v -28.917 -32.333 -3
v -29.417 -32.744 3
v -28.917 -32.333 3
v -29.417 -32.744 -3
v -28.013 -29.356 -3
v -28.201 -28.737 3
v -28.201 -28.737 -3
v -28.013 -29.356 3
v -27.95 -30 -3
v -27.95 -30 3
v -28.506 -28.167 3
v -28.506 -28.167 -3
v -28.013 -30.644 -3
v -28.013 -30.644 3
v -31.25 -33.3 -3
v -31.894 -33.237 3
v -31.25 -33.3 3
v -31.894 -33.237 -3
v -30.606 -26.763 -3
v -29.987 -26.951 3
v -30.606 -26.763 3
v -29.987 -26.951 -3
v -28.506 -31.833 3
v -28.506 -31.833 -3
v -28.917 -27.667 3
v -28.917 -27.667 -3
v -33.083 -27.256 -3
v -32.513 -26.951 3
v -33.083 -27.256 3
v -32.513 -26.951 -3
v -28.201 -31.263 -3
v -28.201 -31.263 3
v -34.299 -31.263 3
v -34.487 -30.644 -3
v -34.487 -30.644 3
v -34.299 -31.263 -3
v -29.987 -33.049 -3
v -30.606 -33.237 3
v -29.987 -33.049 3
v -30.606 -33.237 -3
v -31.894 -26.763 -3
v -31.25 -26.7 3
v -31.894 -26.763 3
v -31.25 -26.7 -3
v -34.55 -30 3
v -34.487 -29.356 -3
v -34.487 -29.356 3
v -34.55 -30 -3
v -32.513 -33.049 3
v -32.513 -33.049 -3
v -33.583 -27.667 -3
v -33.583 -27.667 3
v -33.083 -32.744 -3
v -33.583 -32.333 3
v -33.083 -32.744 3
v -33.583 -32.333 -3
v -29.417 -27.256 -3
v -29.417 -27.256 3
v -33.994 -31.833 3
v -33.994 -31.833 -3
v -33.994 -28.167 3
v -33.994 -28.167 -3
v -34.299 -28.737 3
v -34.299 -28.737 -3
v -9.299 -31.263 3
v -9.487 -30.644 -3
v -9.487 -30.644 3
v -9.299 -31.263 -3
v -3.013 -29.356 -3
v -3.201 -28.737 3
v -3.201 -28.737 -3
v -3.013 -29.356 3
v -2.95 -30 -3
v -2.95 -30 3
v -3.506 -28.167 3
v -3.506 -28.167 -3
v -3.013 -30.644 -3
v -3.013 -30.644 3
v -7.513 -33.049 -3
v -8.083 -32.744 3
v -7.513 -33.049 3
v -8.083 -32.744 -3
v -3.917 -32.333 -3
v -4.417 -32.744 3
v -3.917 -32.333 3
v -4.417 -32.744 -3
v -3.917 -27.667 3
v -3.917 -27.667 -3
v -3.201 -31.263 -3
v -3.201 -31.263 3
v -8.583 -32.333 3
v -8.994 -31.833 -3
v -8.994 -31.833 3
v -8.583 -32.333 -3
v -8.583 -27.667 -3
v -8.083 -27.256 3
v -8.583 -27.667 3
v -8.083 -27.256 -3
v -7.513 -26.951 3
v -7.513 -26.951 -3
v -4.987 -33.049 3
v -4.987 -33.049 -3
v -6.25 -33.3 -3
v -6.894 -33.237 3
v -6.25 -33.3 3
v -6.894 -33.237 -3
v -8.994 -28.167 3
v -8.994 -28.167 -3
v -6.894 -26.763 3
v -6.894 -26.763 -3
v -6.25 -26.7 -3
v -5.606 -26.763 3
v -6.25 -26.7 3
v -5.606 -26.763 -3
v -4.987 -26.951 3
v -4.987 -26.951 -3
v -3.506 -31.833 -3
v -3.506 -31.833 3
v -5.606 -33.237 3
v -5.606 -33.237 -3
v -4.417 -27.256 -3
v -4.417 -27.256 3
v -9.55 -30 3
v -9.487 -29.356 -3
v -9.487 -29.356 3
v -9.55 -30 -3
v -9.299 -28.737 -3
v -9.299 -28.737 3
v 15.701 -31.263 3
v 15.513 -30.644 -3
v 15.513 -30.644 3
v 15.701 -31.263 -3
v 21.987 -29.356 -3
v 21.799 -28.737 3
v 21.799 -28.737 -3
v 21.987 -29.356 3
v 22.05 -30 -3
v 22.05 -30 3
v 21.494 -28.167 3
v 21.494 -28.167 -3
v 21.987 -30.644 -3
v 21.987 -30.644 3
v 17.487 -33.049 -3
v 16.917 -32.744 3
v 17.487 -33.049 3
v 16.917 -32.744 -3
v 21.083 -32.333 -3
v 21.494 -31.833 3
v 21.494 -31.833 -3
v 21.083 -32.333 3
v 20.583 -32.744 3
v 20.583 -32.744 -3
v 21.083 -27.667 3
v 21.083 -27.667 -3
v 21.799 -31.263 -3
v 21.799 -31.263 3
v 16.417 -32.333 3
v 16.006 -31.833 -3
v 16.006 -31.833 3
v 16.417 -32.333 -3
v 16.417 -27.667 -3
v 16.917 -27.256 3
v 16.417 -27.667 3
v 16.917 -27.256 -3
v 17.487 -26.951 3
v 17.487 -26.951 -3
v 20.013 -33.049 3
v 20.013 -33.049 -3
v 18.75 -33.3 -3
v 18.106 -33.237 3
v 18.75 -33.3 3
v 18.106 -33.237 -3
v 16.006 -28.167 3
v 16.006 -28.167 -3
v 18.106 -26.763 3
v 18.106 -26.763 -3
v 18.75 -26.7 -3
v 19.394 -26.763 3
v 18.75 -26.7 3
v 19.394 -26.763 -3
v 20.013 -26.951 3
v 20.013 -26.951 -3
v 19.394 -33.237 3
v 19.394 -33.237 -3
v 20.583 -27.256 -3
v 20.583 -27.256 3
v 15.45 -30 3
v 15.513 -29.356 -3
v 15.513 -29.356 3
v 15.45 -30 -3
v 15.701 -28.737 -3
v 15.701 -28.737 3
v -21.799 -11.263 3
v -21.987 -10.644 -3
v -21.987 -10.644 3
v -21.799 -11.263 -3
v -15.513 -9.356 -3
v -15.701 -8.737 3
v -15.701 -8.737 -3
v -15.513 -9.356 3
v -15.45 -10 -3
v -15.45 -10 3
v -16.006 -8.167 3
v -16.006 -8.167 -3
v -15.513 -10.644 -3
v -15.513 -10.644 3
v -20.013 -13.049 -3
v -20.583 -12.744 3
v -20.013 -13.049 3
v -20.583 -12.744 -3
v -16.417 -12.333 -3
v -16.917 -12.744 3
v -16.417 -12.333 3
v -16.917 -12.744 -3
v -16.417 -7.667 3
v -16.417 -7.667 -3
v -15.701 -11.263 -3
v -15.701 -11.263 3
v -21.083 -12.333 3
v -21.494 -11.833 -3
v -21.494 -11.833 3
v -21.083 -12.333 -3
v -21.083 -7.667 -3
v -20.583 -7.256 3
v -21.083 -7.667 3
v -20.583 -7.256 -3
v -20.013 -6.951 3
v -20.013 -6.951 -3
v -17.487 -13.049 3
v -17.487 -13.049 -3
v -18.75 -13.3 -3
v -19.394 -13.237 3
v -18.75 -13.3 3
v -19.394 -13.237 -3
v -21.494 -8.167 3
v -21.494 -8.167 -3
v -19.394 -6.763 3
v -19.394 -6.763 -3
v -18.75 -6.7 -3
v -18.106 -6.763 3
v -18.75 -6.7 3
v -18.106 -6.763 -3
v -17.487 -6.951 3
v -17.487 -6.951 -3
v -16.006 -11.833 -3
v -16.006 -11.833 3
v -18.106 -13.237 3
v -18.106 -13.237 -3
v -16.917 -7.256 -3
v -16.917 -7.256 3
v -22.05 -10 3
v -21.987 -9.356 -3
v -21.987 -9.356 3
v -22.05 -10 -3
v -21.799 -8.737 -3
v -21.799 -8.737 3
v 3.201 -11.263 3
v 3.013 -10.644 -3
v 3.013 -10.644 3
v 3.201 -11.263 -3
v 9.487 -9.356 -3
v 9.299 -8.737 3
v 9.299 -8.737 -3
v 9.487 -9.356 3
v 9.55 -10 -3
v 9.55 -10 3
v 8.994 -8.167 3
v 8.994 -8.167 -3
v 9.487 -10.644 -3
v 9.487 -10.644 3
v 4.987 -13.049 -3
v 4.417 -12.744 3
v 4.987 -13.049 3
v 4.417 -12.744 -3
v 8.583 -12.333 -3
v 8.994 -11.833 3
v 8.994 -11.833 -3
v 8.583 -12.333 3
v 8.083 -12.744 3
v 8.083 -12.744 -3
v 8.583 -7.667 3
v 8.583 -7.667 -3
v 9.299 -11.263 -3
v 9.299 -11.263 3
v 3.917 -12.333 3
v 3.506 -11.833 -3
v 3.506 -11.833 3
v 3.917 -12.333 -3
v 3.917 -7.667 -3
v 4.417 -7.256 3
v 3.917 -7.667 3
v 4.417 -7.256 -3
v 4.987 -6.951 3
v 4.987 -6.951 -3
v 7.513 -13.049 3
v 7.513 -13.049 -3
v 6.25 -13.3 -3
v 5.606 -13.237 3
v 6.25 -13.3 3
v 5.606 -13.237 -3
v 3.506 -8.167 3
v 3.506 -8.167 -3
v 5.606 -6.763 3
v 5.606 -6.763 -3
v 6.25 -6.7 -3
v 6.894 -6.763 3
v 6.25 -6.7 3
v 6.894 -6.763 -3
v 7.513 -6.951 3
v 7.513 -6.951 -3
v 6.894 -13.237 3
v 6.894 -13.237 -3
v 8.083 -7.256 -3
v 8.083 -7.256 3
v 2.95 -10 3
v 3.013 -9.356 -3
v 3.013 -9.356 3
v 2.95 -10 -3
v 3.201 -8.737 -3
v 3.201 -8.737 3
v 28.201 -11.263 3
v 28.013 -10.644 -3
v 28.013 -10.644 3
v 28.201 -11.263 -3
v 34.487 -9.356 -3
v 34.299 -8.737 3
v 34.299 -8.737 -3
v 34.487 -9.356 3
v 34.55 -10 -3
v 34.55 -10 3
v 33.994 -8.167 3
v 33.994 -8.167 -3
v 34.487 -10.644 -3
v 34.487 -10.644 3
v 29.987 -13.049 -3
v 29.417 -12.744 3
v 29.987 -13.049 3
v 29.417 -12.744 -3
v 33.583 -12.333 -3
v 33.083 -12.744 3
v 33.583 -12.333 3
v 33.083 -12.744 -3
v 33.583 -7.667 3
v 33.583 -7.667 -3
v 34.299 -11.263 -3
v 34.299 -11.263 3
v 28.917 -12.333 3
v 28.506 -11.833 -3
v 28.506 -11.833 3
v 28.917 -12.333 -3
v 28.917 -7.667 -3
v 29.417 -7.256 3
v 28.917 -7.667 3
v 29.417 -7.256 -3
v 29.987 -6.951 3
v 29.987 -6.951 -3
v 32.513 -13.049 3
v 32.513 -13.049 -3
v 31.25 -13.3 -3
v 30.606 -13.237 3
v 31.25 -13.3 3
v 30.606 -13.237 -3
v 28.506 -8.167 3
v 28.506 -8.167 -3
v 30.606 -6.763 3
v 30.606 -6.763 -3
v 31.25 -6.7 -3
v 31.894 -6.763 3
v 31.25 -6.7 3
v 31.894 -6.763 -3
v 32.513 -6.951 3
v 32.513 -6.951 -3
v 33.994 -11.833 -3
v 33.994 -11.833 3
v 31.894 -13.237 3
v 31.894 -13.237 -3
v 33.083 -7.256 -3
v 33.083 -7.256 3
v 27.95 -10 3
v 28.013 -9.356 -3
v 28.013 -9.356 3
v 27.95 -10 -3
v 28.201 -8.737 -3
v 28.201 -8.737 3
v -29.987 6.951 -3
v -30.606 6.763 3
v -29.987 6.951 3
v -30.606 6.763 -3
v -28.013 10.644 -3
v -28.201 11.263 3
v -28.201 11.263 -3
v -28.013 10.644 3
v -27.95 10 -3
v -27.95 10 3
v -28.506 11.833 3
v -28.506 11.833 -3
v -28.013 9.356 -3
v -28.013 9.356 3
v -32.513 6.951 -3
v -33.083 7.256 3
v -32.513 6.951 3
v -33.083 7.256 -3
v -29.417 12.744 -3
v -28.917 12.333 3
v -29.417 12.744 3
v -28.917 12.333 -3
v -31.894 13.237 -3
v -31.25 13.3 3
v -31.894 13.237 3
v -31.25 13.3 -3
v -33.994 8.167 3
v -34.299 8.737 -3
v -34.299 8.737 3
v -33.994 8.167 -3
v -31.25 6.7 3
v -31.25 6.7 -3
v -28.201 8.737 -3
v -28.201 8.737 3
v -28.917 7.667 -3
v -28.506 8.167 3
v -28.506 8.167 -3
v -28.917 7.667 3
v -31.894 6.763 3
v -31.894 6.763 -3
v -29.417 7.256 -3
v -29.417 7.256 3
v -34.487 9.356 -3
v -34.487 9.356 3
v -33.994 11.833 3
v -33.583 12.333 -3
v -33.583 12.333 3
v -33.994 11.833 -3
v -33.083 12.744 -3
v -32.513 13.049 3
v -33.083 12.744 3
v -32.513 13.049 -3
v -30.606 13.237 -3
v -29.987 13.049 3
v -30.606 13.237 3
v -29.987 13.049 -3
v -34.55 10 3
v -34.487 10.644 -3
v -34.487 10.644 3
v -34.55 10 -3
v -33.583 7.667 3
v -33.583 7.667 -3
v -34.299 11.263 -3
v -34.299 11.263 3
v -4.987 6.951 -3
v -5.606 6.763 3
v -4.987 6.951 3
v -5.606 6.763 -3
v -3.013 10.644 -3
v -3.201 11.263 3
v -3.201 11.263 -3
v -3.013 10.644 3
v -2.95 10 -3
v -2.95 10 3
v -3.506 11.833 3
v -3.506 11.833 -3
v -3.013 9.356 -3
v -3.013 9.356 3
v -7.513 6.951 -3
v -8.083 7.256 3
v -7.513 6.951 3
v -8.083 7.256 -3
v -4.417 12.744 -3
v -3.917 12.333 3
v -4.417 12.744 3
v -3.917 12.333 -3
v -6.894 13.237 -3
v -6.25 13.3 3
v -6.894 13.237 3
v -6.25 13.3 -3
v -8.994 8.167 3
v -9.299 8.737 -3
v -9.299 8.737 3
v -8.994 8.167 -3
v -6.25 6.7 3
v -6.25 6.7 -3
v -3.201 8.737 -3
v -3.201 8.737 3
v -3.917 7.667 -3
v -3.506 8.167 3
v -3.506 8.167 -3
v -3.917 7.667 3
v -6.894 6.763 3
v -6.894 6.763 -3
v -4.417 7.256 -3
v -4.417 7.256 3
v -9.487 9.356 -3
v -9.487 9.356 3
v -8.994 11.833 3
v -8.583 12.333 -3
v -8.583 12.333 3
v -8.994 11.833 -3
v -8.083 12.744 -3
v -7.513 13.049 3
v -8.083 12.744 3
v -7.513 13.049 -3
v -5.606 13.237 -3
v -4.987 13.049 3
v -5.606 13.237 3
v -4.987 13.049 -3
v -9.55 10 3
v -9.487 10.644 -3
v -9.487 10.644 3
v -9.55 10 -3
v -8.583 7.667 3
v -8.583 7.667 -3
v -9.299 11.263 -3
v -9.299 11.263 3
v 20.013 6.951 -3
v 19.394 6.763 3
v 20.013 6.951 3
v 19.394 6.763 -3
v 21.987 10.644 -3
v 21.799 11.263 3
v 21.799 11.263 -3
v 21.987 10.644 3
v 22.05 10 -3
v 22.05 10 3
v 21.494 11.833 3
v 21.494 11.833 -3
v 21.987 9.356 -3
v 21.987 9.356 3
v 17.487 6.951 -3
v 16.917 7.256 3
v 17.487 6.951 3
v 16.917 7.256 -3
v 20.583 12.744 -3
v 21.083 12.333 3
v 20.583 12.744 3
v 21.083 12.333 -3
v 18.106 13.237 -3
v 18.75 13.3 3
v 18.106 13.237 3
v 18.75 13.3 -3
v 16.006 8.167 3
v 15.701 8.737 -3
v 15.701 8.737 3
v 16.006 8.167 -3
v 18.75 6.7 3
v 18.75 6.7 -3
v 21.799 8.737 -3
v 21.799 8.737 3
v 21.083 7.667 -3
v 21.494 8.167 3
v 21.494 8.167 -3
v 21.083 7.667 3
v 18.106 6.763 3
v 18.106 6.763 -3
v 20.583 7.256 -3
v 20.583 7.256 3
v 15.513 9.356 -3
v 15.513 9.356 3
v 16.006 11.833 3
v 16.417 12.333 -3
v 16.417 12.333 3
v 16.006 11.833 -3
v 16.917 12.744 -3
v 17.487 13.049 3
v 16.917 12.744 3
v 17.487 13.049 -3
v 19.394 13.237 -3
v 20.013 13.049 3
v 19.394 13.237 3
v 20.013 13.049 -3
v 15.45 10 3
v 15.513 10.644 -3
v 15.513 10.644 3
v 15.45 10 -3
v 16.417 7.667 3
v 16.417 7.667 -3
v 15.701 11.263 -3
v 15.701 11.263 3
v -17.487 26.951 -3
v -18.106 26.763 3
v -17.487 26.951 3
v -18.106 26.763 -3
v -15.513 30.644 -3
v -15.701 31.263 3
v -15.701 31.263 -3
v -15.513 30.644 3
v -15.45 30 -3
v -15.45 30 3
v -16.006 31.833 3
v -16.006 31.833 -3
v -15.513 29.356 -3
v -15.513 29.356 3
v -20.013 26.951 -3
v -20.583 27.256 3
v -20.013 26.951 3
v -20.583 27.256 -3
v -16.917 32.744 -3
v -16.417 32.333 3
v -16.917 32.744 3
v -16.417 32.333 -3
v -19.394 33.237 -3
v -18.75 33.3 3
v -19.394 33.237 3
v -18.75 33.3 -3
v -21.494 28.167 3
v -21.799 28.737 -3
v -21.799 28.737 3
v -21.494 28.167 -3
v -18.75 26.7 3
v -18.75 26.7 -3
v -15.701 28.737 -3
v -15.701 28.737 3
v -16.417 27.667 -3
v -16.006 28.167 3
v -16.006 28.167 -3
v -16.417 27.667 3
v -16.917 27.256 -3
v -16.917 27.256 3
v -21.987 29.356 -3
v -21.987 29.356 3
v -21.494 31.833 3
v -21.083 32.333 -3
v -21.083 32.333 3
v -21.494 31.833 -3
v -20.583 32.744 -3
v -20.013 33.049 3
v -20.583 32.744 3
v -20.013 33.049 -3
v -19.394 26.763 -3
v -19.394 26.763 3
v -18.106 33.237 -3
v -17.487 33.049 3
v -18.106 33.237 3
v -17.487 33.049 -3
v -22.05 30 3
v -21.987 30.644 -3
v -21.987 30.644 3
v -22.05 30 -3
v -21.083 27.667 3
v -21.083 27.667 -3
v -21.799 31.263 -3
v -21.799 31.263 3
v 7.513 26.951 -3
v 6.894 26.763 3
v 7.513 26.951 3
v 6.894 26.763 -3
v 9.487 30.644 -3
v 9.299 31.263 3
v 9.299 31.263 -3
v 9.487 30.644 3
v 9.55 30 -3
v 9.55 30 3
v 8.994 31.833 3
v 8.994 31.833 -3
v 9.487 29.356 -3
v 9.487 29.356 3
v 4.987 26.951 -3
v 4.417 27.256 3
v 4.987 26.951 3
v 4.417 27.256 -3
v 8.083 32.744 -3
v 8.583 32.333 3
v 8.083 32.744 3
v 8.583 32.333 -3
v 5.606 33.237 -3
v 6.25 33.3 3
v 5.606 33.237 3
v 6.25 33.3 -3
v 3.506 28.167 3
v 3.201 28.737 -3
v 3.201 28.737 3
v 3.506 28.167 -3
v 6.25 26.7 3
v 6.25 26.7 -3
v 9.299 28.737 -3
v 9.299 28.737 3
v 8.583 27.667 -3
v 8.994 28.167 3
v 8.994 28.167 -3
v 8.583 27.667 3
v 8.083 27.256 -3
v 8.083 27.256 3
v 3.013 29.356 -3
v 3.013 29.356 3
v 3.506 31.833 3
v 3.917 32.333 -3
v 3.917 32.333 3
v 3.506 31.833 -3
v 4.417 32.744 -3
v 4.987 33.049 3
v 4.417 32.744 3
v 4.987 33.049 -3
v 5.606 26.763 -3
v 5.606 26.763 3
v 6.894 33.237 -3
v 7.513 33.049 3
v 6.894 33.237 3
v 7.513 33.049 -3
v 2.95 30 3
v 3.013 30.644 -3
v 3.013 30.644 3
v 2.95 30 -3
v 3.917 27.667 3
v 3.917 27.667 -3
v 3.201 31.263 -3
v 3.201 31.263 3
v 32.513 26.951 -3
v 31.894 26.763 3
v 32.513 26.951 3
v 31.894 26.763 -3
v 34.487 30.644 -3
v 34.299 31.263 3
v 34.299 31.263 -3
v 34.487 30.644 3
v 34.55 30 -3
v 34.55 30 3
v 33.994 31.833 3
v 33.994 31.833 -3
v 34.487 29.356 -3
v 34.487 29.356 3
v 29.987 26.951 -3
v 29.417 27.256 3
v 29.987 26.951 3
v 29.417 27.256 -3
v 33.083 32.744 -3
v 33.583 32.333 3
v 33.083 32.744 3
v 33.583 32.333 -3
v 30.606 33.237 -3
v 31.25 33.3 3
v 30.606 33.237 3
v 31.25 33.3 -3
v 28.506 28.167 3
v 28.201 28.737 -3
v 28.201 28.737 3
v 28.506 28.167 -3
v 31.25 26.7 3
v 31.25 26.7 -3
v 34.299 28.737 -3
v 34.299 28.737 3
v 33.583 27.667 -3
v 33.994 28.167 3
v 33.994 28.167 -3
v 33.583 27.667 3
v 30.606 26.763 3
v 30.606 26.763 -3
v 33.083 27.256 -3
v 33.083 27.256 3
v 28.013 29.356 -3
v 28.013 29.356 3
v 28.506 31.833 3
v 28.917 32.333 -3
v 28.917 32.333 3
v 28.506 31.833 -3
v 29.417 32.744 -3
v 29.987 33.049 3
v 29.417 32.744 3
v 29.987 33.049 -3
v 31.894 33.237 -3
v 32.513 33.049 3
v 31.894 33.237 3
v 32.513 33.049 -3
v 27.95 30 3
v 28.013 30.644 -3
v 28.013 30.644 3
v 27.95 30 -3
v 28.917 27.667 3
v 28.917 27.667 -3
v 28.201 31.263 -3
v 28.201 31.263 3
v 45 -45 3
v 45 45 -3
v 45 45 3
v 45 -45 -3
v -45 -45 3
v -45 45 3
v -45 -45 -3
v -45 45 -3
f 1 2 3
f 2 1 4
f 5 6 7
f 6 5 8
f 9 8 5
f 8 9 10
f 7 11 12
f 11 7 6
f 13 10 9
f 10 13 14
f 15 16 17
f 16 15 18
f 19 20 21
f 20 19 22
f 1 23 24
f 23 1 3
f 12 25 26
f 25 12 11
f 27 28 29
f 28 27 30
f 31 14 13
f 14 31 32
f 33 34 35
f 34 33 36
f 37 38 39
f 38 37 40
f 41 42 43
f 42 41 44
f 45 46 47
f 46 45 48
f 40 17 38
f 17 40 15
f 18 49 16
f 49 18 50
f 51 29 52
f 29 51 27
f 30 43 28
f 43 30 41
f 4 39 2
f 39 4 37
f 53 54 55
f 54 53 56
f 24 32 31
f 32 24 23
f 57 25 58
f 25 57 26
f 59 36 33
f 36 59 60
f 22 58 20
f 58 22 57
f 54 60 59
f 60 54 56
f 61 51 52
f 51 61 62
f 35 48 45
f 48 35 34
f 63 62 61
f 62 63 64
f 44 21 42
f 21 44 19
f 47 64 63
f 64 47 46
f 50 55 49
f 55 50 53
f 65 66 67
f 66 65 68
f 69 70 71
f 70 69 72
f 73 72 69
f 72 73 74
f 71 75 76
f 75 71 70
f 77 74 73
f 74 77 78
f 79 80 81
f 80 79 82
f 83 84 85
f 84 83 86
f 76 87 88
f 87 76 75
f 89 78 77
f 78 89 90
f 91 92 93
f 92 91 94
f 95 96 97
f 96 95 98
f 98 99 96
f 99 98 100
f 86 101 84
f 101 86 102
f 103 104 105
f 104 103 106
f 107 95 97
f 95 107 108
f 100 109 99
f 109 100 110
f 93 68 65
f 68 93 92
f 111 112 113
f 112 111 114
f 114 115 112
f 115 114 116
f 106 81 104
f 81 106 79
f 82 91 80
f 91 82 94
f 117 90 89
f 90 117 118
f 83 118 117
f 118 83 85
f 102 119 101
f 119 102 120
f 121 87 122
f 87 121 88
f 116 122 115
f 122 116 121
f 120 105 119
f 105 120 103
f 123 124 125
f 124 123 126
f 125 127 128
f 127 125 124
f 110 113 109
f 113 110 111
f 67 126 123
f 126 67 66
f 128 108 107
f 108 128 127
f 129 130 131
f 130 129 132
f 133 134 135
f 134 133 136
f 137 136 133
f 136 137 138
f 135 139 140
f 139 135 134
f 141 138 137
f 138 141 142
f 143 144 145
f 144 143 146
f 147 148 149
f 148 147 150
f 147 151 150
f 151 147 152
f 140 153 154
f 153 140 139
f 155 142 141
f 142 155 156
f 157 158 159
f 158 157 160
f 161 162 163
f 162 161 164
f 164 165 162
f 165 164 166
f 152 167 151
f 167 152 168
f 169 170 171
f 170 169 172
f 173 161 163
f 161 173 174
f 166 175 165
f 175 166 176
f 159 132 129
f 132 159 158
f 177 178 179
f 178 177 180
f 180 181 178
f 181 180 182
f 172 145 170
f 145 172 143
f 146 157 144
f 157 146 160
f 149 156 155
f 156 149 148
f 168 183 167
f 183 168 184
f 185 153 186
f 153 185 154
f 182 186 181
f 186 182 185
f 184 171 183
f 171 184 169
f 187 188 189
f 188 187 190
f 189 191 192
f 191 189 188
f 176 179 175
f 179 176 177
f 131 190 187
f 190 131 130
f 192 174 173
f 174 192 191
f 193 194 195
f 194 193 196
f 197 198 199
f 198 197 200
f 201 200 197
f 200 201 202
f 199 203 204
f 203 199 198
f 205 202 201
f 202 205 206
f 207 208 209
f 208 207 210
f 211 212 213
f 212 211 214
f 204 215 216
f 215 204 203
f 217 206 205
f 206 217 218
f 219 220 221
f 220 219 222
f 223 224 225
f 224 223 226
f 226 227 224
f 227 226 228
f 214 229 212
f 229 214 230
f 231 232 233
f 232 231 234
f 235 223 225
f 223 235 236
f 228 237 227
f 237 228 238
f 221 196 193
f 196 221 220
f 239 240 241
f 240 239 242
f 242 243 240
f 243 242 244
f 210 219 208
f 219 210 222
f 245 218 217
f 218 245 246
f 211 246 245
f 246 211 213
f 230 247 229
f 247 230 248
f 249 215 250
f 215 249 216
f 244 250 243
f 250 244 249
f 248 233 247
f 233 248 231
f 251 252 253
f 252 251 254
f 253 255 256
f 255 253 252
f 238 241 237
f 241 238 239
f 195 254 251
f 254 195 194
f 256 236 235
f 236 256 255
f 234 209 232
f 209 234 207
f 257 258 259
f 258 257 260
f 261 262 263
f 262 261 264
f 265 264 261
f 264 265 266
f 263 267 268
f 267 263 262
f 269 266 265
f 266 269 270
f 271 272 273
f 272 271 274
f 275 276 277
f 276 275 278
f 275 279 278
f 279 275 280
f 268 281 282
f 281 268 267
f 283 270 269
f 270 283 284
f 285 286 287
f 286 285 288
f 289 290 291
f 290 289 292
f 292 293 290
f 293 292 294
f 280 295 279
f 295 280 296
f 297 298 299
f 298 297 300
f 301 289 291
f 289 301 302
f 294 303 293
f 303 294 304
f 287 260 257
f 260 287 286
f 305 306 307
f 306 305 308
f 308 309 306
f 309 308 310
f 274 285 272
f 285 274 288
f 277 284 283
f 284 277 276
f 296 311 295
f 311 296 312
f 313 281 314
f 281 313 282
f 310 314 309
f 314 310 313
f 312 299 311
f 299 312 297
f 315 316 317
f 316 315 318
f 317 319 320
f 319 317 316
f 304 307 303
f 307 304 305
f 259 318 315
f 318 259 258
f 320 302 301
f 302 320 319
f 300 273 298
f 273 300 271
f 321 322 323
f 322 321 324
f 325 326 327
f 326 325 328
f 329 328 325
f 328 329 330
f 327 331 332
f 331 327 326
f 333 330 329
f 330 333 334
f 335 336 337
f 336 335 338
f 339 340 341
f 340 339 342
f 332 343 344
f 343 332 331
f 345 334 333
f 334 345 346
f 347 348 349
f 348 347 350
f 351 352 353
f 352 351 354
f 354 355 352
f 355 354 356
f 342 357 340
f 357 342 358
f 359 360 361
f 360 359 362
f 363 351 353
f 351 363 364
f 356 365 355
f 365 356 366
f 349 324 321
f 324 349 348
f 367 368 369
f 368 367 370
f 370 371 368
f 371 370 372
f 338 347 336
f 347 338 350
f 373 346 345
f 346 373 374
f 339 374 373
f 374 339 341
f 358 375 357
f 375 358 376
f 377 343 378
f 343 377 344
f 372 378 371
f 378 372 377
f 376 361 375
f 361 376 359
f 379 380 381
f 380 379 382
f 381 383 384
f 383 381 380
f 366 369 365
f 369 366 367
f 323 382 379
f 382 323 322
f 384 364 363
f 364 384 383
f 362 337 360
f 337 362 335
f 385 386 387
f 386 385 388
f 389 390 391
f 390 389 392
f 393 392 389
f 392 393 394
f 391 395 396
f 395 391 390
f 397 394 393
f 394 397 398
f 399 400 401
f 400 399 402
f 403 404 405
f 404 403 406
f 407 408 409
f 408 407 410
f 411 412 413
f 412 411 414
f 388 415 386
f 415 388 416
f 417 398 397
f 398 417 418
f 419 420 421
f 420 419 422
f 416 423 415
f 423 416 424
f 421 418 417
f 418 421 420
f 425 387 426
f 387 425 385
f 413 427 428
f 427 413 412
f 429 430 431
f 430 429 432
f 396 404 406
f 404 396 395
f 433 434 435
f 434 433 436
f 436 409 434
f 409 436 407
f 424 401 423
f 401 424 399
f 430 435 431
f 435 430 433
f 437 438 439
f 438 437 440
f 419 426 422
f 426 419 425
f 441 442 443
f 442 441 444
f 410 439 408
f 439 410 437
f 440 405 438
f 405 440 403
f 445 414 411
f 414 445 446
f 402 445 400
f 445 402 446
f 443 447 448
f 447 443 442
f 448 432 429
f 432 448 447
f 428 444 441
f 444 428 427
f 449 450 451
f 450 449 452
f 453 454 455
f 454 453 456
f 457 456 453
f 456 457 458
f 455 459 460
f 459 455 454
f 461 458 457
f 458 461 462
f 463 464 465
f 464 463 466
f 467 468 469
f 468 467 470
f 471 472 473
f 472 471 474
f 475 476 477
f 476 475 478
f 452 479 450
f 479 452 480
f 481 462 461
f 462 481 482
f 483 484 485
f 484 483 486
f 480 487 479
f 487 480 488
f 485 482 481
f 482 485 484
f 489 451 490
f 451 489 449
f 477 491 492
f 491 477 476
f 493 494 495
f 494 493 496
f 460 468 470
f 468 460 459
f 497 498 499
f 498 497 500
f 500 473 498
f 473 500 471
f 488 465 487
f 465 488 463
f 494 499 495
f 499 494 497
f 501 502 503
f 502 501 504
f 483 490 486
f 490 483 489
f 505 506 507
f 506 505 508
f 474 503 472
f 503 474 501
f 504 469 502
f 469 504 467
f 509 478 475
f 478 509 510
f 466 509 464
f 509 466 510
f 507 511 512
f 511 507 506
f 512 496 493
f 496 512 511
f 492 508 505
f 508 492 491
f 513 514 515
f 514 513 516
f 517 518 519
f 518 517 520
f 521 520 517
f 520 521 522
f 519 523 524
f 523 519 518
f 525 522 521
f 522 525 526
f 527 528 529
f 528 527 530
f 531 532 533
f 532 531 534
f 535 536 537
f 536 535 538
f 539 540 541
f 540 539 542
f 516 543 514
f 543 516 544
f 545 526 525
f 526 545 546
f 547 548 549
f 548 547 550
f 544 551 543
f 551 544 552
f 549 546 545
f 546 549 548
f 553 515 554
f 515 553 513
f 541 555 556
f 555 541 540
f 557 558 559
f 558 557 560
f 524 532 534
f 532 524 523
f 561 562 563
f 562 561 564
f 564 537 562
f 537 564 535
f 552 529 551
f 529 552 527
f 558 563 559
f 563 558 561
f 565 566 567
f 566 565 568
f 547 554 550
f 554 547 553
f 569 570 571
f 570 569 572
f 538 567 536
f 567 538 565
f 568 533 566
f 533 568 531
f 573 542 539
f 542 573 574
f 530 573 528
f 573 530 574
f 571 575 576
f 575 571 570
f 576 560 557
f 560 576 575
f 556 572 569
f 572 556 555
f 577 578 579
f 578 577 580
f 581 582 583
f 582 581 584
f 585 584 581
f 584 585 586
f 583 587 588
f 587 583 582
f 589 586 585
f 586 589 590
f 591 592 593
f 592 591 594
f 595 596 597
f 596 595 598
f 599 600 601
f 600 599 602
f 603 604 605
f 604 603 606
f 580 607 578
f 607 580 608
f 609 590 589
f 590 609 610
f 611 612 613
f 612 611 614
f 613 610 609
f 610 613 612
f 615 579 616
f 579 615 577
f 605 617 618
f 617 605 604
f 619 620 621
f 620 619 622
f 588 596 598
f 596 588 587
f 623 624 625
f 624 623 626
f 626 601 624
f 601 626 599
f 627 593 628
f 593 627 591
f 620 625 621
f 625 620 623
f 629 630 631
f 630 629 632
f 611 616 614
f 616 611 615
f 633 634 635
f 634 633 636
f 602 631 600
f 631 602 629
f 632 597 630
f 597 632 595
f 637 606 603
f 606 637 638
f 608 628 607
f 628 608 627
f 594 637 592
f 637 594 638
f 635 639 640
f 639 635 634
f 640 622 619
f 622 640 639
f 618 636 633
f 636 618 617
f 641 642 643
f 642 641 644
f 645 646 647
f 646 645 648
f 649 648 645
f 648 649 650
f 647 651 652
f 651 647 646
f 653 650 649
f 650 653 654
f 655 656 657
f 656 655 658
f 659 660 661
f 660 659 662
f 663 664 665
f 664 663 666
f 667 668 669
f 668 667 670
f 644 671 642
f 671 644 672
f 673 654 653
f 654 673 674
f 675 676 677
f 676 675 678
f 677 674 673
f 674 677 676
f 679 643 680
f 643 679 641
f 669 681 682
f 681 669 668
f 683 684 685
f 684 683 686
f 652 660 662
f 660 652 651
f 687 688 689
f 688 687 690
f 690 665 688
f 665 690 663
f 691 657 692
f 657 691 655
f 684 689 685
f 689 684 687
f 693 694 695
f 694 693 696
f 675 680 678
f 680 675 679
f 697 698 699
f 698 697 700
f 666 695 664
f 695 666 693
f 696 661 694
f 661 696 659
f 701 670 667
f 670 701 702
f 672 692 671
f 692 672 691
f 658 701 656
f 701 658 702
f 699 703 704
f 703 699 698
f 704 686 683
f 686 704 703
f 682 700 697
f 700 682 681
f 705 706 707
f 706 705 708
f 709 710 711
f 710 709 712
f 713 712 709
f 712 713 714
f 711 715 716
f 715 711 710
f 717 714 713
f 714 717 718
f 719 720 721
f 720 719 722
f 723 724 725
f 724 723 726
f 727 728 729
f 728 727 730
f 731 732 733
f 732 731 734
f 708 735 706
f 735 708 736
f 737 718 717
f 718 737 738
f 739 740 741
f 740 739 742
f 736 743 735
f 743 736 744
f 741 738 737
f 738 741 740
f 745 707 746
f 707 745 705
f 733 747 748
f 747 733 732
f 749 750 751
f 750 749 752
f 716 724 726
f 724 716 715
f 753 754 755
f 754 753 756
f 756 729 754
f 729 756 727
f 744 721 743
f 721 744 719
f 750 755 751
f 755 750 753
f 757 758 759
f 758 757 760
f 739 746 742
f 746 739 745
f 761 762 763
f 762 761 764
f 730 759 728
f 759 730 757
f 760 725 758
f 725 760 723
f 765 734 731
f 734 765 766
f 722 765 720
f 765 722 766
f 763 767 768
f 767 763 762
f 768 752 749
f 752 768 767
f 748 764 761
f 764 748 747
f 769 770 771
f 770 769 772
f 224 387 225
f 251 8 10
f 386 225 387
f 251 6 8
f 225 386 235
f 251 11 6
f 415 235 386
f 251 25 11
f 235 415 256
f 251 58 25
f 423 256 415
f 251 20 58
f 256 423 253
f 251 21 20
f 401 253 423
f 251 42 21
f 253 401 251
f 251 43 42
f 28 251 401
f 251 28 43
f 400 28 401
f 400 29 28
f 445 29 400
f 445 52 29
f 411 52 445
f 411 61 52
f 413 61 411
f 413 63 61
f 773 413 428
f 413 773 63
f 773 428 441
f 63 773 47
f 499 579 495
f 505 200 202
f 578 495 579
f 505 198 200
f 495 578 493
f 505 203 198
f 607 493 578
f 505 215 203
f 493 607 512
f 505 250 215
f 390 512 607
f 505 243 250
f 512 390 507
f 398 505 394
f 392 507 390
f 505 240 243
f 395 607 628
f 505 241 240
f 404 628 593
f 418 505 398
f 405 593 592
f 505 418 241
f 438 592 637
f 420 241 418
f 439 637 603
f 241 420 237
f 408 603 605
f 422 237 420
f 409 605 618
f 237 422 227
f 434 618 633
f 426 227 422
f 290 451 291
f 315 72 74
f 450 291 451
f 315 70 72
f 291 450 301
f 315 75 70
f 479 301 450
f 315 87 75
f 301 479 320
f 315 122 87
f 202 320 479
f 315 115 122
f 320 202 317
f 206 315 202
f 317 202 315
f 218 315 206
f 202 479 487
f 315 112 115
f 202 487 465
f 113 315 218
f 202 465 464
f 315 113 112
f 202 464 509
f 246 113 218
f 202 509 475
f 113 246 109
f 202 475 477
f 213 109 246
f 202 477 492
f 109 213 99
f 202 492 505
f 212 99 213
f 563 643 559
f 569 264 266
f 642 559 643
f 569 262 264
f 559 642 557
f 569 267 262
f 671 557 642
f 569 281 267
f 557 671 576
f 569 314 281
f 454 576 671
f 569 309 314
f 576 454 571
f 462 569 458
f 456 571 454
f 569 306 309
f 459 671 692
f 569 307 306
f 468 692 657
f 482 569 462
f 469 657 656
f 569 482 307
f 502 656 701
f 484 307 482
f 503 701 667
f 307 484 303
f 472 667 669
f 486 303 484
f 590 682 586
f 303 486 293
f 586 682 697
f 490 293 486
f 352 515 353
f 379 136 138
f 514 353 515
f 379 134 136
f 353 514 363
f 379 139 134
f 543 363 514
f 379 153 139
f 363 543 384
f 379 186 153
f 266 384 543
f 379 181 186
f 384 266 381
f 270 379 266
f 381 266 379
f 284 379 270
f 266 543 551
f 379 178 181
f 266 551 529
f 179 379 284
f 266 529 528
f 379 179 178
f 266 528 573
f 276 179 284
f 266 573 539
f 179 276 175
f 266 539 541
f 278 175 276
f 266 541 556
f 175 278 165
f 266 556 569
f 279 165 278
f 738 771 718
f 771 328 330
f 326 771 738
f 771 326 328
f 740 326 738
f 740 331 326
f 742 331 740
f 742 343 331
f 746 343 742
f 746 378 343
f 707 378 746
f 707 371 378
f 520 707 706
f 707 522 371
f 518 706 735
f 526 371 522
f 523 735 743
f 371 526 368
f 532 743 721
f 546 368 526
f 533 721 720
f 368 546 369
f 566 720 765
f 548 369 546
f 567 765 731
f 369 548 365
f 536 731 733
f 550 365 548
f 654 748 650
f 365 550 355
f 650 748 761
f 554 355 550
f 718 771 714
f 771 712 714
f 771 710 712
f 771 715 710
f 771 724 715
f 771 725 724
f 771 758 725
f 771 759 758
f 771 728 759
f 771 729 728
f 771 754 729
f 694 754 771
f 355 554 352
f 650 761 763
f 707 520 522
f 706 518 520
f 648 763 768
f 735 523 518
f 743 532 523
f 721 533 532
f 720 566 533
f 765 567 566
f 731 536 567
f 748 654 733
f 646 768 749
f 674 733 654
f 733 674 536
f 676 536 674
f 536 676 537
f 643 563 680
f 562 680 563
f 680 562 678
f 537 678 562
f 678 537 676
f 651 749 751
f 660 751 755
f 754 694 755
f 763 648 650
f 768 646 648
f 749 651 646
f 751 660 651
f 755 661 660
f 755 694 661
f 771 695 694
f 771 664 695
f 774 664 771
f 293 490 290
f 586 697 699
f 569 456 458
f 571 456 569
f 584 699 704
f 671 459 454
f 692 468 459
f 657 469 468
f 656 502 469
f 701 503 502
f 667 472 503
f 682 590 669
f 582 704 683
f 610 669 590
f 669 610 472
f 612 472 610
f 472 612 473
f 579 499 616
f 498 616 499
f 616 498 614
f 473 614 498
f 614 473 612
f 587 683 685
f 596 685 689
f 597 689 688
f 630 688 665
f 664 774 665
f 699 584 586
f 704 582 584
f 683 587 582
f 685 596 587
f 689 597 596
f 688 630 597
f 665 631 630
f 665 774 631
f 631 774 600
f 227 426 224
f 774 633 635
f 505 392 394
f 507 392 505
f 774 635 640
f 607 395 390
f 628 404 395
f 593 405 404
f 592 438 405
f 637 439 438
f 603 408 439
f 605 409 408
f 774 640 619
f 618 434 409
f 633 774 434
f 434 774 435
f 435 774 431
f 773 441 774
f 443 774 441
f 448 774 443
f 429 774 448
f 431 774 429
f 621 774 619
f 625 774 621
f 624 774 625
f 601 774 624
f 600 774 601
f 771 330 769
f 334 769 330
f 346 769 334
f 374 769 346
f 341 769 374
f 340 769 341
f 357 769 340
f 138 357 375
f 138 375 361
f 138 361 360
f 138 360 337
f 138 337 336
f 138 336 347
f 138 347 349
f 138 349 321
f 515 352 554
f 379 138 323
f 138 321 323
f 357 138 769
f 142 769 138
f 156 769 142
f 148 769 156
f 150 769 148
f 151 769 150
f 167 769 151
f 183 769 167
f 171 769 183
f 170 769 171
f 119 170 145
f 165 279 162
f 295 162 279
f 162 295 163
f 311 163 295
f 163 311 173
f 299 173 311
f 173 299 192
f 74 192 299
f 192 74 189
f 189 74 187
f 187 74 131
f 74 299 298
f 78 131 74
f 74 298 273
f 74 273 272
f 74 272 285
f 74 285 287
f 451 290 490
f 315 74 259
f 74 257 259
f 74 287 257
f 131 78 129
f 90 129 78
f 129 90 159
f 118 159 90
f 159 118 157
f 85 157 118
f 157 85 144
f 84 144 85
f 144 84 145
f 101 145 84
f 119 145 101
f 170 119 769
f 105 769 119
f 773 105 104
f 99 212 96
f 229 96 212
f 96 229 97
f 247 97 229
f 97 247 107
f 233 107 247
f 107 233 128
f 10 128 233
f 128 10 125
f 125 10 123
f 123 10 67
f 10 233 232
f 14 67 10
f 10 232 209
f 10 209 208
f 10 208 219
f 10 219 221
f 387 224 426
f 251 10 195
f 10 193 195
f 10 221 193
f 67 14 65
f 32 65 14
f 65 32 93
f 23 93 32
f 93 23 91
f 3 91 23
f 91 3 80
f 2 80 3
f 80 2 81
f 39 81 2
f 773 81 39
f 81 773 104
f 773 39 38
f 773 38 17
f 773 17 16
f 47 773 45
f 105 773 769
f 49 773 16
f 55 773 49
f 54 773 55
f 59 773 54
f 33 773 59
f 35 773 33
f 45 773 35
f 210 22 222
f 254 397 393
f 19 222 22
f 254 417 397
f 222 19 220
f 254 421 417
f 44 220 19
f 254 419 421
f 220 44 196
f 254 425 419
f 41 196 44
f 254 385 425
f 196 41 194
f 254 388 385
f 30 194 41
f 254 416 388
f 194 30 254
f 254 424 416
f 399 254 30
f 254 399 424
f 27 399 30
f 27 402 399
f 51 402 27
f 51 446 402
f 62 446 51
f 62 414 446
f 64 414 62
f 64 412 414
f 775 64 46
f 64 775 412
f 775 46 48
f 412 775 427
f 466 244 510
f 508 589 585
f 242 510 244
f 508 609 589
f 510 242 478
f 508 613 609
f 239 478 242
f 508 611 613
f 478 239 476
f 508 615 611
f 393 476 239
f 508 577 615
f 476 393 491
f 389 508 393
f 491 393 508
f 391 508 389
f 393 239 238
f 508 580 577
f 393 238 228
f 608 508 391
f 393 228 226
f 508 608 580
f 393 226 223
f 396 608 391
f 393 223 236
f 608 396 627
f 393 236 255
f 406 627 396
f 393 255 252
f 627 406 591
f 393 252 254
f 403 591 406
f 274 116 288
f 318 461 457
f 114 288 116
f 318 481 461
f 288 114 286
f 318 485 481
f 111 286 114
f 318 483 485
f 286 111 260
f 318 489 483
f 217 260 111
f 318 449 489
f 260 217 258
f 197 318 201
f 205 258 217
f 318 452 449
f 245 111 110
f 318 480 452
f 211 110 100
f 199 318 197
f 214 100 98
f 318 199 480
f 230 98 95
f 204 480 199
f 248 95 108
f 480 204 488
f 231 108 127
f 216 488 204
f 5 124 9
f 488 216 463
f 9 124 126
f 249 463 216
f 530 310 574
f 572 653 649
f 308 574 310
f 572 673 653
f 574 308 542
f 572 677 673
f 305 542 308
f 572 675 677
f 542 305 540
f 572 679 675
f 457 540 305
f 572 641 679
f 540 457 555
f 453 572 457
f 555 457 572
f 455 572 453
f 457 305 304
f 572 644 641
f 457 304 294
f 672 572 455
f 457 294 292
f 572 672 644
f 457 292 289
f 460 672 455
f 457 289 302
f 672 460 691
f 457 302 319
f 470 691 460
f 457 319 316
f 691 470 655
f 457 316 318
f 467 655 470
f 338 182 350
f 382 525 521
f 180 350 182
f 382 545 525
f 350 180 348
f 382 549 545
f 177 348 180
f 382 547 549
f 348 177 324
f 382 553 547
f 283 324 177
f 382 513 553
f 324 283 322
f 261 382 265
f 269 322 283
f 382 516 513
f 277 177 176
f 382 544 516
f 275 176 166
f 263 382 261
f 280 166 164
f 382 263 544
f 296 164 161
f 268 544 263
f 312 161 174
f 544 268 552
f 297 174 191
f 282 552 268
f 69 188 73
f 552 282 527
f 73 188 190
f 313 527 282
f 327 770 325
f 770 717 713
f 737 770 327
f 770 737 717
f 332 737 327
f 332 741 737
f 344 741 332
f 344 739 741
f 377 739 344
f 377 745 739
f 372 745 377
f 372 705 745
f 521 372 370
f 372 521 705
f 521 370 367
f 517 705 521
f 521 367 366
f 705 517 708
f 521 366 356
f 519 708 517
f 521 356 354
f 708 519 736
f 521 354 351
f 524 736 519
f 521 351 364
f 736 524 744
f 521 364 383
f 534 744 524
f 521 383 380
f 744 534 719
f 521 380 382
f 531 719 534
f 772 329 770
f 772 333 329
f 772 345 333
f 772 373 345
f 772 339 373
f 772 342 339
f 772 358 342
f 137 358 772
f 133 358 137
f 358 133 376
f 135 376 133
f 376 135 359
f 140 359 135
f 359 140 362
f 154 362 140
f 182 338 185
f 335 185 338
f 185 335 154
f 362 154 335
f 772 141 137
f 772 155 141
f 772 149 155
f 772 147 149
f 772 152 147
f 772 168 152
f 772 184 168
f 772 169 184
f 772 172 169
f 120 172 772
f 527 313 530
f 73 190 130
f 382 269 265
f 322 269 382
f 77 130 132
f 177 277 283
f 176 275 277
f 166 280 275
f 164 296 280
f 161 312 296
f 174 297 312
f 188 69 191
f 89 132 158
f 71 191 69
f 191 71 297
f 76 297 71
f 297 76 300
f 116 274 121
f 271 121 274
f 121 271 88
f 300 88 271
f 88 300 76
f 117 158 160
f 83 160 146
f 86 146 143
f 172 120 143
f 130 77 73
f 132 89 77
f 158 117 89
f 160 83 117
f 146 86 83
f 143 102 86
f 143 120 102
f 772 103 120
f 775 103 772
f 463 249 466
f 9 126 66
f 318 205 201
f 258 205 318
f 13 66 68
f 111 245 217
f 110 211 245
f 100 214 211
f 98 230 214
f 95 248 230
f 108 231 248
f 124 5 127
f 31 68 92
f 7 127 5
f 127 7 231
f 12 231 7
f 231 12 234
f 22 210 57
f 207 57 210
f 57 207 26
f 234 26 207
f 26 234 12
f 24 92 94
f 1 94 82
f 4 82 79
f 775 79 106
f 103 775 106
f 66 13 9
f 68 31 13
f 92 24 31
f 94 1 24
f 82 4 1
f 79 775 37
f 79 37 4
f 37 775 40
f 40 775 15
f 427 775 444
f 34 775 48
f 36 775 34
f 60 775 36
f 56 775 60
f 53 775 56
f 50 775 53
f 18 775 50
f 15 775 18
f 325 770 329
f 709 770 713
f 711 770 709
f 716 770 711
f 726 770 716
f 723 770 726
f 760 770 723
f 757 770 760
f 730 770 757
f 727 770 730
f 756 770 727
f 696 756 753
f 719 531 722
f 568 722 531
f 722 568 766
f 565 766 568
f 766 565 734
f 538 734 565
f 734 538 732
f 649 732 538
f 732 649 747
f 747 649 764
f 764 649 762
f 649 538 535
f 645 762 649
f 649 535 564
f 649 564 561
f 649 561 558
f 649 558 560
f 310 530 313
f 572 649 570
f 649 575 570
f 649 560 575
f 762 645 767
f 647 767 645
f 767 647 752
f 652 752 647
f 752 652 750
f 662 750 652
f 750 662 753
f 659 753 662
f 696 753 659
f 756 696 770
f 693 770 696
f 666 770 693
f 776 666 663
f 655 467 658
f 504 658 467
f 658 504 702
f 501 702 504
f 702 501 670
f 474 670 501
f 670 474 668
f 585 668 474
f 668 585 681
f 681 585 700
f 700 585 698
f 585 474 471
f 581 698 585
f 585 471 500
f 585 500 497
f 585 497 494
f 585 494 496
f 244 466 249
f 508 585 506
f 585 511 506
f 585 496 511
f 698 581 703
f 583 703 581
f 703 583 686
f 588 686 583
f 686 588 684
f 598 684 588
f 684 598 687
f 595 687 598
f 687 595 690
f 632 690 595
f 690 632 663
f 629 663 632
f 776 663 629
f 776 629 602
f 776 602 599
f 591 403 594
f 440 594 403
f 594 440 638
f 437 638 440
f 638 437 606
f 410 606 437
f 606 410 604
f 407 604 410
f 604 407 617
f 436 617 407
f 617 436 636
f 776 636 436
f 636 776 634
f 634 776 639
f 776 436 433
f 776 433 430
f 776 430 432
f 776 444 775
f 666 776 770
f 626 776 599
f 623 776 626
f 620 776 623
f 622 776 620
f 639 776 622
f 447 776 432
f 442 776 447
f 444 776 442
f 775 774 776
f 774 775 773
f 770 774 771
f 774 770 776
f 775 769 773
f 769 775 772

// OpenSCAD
$fn = 32;

// ----------------------------------------------------------------------
// Perforated panel 90 x 90 x 6
// 4 x 3 Ø6.6 holes, checker layout
// ----------------------------------------------------------------------

// --- parameters (mm) ---
panel = [90, 90, 6];  // overall size (x, y, z)
seat_tol = 0.05;      // tolerance at the seating features
free_tol = 0.3;       // general tolerance on the free sizes
hole_d = 6.6;         // hole diameter
pitch_x = 25;         // hole pitch along X
pitch_y = 20;         // hole pitch along Y

// --- derived feature positions (mm) ---
margin = hole_d / 2 + 2;            // = 5.3   clearance from the panel edge
row_offset = pitch_x / 2;           // = 12.5   shift of every other row
cols = floor((panel[0] - 2 * margin - row_offset) / pitch_x) + 1;  // = 3   how many columns fit in X
rows = floor((panel[1] - 2 * margin) / pitch_y) + 1;  // = 4   how many rows fit in Y
span_x = (cols - 1) * pitch_x + row_offset;  // = 62.5   width of the field
span_y = (rows - 1) * pitch_y;      // = 60   height of the field
origin_x = -span_x / 2;             // = -31.25   X of the first hole
origin_y = -span_y / 2;             // = -30   Y of the first row
holes = rows * cols;                // = 12   holes in total
feature_centers = [
  [origin_x + 0 * pitch_x, origin_y + 0 * pitch_y],
  [origin_x + 1 * pitch_x, origin_y + 0 * pitch_y],
  [origin_x + 2 * pitch_x, origin_y + 0 * pitch_y],
  [origin_x + row_offset + 0 * pitch_x, origin_y + 1 * pitch_y],
  [origin_x + row_offset + 1 * pitch_x, origin_y + 1 * pitch_y],
  [origin_x + row_offset + 2 * pitch_x, origin_y + 1 * pitch_y],
  [origin_x + 0 * pitch_x, origin_y + 2 * pitch_y],
  [origin_x + 1 * pitch_x, origin_y + 2 * pitch_y],
  [origin_x + 2 * pitch_x, origin_y + 2 * pitch_y],
  [origin_x + row_offset + 0 * pitch_x, origin_y + 3 * pitch_y],
  [origin_x + row_offset + 1 * pitch_x, origin_y + 3 * pitch_y],
  [origin_x + row_offset + 2 * pitch_x, origin_y + 3 * pitch_y]
];   // hole centres, used verbatim by the cutter loop

// panel outline, every hole through
difference() {
  cube(panel, center = true);
  for (centre = feature_centers)
    translate([centre[0], centre[1], 0])
      cylinder(d = hole_d, h = panel[2] + 2, center = true);
}
